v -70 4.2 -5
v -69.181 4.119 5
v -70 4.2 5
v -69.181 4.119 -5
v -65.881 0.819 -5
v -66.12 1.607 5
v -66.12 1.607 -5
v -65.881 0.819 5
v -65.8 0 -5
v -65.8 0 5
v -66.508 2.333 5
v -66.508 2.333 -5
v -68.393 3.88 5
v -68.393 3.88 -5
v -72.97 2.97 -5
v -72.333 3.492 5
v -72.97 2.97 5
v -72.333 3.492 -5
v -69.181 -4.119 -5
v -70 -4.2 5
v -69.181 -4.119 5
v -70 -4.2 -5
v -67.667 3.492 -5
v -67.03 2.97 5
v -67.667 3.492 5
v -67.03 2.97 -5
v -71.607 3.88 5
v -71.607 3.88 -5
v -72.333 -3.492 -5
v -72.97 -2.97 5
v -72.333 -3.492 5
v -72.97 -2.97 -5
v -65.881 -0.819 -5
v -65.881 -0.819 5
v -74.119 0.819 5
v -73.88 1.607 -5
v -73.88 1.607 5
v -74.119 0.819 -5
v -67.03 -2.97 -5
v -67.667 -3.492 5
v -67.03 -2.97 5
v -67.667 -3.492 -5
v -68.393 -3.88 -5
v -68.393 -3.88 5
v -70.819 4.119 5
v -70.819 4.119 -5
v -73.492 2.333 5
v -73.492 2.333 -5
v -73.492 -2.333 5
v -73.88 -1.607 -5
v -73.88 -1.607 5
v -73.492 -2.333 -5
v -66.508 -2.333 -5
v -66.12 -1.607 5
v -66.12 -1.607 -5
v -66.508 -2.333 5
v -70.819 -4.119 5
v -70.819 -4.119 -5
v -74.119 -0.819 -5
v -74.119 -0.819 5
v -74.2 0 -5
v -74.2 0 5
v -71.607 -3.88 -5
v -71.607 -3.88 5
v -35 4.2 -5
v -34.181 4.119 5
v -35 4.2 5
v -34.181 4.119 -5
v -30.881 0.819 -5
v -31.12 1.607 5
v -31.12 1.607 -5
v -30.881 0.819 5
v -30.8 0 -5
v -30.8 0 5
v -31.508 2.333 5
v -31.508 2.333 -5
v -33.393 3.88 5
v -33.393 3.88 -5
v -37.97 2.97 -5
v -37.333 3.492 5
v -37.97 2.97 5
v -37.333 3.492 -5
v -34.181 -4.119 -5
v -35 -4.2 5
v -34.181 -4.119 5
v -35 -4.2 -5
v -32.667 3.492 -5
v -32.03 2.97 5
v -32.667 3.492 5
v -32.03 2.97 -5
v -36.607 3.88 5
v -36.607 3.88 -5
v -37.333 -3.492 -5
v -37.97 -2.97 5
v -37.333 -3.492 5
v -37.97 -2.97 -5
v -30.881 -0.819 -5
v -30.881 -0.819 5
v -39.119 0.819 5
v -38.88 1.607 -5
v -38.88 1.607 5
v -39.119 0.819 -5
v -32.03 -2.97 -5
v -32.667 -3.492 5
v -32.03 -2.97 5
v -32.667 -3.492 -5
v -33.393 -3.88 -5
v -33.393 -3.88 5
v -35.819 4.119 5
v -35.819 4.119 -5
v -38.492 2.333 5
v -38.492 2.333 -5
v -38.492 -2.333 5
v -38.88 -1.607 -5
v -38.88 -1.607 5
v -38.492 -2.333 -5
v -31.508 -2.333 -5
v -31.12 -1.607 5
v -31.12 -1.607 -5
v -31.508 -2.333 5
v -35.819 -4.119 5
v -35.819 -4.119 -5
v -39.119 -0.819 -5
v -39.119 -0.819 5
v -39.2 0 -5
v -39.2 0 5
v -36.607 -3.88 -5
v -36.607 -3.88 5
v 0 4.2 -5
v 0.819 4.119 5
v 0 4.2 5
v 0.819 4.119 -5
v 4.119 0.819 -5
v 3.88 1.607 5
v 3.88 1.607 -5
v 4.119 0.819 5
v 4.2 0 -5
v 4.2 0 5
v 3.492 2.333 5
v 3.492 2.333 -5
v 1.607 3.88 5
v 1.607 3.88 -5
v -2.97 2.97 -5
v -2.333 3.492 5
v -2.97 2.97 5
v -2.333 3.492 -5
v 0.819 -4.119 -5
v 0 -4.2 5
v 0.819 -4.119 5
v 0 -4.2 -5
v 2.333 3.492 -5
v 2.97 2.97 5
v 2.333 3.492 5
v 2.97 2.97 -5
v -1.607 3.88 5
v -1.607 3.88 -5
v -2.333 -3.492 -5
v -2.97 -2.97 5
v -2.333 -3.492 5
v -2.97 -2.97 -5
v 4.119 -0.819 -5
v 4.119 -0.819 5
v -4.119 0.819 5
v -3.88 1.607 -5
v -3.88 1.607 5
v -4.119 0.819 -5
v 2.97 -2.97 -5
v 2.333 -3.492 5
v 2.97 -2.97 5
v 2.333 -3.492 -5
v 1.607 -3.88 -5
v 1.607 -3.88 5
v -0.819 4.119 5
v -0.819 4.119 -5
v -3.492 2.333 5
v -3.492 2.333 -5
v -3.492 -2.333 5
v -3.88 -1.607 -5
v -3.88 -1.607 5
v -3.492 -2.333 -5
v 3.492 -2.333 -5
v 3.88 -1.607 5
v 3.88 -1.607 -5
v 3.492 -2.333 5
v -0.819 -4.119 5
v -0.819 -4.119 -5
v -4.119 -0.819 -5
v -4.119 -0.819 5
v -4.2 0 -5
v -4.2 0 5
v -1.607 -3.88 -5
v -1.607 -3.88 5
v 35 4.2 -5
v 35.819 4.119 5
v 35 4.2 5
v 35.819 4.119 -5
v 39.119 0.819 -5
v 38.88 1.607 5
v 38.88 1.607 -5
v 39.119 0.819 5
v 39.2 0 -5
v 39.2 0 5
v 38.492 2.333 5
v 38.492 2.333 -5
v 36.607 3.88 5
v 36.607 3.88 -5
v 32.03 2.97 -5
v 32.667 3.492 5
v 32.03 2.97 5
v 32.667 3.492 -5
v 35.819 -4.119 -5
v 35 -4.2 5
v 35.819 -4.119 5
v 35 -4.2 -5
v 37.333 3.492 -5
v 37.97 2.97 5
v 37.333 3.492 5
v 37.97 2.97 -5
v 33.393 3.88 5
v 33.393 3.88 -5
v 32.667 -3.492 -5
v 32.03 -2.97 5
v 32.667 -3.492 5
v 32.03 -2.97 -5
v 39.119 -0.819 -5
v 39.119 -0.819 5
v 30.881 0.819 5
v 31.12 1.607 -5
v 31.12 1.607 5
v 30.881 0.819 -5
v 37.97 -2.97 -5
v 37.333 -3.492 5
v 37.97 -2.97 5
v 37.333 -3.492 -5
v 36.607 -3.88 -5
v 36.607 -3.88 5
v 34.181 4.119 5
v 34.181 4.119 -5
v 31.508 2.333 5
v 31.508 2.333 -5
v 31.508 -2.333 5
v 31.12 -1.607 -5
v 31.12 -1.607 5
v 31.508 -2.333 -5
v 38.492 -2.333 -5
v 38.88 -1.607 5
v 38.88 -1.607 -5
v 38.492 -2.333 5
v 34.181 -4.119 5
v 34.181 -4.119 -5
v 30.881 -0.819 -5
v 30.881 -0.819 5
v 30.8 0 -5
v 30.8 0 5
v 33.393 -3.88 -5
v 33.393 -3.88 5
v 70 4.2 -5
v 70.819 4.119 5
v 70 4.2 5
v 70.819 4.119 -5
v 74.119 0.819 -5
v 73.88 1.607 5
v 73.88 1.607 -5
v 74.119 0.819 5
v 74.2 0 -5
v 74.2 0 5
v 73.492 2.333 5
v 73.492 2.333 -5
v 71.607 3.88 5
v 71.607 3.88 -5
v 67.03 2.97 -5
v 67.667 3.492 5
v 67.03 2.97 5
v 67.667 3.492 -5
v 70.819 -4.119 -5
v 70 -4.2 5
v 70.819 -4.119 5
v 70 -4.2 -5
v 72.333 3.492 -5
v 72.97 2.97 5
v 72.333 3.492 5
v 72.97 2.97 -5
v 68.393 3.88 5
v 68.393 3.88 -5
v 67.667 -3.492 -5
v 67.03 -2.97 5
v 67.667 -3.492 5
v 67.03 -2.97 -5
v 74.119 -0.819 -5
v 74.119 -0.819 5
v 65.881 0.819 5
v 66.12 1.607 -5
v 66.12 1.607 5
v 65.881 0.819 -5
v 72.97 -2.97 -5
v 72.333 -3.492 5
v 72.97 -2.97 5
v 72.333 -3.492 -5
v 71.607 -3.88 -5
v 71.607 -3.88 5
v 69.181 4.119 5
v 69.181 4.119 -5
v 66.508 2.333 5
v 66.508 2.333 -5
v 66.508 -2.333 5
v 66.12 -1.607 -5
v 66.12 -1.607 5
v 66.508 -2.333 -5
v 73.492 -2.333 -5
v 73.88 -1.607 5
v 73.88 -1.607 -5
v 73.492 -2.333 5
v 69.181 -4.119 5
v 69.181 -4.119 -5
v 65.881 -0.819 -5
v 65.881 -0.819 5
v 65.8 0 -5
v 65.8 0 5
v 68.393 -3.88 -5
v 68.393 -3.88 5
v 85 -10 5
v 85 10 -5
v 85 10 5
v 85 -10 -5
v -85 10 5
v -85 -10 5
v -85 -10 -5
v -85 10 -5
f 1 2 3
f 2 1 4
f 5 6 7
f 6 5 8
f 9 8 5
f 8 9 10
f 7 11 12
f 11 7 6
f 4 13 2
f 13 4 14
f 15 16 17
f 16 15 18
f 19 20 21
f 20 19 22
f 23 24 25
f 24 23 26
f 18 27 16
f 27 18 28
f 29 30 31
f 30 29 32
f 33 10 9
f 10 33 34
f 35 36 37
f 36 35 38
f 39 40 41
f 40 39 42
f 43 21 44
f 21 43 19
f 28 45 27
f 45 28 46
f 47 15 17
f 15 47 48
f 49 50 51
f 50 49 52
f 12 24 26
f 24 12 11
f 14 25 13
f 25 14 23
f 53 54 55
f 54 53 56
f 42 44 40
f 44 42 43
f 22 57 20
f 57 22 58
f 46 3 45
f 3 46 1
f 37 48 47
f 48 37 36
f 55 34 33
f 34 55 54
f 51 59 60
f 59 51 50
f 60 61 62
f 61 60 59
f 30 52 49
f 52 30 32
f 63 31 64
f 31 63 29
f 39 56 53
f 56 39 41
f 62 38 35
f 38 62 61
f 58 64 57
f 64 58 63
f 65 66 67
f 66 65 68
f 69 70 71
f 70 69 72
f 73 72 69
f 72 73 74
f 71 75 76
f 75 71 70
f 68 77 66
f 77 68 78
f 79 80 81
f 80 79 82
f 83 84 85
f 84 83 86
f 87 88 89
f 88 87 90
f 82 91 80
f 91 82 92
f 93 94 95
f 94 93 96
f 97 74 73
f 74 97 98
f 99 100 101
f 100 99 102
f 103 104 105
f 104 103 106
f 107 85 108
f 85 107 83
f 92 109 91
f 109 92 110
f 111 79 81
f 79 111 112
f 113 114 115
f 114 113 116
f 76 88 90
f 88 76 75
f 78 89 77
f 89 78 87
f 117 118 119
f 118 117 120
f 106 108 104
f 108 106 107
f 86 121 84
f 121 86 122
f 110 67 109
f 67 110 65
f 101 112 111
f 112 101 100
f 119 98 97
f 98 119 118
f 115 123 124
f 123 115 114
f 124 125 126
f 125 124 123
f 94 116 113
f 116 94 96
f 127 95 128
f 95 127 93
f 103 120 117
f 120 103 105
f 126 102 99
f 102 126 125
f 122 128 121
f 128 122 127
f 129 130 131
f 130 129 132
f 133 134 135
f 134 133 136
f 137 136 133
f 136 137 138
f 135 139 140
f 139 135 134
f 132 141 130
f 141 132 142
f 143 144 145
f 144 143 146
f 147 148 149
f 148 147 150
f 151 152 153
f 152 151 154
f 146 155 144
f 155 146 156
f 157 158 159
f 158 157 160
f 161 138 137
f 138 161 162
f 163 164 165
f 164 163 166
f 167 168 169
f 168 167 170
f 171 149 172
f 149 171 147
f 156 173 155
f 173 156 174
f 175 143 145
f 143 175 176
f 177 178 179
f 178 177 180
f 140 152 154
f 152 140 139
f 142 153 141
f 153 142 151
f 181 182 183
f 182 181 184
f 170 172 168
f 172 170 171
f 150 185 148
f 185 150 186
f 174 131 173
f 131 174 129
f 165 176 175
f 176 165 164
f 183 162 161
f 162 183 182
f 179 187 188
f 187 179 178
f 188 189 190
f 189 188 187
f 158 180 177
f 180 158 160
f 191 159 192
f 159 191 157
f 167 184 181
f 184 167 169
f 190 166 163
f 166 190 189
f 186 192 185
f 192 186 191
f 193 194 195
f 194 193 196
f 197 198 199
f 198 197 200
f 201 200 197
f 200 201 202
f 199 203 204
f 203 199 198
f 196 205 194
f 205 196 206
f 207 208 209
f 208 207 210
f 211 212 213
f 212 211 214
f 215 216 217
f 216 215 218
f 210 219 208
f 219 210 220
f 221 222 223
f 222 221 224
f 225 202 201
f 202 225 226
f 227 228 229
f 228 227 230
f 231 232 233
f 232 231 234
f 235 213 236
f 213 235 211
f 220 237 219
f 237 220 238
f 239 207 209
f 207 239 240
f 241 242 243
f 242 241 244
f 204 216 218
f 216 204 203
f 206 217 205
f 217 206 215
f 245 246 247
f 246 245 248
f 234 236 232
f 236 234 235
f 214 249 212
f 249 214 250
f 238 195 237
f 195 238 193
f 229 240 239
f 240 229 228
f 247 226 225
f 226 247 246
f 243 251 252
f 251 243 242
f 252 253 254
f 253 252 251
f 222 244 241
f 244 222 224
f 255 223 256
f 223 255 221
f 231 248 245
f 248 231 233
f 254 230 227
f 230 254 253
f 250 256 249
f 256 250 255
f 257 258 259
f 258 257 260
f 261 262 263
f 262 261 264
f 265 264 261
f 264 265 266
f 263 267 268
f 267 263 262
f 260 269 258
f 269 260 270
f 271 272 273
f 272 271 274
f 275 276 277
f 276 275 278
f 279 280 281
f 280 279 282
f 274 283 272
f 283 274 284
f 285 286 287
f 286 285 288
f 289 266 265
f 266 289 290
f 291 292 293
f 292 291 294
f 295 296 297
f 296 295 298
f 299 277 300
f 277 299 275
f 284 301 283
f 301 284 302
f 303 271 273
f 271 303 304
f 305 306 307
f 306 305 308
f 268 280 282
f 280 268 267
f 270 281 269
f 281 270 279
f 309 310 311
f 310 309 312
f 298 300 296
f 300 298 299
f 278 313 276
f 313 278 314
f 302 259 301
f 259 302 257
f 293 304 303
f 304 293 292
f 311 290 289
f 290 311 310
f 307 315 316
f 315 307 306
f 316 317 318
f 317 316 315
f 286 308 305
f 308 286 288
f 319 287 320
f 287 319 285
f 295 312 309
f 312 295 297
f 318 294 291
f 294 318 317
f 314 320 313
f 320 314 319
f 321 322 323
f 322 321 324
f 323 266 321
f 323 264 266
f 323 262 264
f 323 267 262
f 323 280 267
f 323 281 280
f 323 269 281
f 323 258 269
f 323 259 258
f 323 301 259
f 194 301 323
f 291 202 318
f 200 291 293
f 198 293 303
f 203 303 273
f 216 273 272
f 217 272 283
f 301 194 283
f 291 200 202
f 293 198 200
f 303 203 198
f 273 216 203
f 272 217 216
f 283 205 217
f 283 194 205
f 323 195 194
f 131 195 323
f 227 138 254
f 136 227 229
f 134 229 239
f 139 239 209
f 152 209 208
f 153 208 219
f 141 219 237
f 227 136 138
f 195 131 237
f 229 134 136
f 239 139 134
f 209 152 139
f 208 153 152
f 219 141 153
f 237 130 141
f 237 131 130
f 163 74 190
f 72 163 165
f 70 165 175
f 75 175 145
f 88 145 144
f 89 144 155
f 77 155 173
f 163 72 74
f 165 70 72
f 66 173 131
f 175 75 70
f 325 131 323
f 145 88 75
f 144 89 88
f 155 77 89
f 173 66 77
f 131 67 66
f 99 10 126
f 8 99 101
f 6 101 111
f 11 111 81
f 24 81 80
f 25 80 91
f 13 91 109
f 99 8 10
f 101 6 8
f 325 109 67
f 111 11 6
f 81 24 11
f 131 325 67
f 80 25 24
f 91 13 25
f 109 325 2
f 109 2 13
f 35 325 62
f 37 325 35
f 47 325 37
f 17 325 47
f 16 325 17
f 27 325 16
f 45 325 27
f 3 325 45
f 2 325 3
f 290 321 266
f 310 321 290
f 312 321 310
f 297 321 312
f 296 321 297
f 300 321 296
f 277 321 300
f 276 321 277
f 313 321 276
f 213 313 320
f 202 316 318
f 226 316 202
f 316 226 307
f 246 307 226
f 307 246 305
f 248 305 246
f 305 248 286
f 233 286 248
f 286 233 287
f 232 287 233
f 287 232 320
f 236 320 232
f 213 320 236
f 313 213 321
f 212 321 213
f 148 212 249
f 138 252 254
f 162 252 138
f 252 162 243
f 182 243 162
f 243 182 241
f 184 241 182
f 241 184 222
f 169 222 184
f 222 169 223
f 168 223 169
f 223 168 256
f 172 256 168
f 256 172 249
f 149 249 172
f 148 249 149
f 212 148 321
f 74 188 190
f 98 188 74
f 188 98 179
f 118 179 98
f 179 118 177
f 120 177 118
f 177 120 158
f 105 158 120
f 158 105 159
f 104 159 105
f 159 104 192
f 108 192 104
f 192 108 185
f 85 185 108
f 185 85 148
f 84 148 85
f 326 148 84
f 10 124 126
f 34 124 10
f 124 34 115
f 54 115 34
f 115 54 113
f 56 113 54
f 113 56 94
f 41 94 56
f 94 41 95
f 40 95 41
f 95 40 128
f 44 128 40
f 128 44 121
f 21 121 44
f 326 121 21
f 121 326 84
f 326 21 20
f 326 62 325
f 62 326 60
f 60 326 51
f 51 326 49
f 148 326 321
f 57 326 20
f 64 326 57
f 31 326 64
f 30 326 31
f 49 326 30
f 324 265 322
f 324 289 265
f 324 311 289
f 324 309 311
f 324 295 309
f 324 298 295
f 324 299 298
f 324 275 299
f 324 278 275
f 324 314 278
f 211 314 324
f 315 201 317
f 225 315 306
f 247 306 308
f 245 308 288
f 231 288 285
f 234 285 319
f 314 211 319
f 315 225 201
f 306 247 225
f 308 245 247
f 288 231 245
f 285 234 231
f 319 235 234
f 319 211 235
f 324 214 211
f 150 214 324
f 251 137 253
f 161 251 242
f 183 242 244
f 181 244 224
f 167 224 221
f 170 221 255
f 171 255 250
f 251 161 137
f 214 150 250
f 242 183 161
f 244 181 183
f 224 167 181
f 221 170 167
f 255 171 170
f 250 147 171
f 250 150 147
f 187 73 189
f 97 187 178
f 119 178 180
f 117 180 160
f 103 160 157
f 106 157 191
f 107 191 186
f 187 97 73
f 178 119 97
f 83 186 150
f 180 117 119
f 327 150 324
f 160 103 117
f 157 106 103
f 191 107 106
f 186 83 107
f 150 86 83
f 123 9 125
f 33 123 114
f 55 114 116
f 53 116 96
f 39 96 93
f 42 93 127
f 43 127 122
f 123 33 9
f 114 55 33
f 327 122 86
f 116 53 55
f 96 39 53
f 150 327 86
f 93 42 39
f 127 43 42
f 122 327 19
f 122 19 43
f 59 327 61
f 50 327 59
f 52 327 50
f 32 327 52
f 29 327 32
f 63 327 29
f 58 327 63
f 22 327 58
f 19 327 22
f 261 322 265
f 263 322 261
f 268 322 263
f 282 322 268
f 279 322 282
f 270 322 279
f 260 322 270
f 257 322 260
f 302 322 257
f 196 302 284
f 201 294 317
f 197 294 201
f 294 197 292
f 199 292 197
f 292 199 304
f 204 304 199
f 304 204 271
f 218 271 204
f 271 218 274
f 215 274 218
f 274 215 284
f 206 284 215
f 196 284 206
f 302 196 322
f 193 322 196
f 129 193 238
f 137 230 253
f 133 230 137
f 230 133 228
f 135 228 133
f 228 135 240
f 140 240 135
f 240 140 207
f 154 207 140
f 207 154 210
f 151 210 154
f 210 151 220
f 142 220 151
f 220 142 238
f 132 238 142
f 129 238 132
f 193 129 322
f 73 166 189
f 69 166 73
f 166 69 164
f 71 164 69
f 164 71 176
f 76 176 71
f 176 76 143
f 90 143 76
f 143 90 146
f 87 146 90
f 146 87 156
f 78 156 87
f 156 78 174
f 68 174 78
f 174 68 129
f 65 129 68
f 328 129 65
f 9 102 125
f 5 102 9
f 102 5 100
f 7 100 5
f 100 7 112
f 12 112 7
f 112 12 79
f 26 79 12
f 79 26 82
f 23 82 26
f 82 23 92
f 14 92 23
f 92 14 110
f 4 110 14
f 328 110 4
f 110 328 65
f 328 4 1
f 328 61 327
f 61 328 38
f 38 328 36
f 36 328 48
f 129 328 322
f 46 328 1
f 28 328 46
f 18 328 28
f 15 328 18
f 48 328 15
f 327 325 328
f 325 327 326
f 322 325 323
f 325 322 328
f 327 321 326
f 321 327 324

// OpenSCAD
$fn = 32;

// ----------------------------------------------------------------------
// Hole bar, 5 x Ø8.4
// row layout, 15 mm edge offset
// ----------------------------------------------------------------------

// --- parameters (mm) ---
bar_w = 20;    // bar width (Y)
bar_t = 10;    // bar thickness (Z)
holes = 5;     // holes per row
hole_d = 8.4;  // hole diameter
edge = 15;     // offset from the bar end to the first hole
pitch = 35;    // pitch between neighbouring holes

// --- derived feature positions (mm) ---
span = (holes - 1) * pitch;   // = 140   distance between the end holes
bar_l = span + 2 * edge;      // = 170   overall bar length
start_x = -bar_l / 2 + edge;  // = -70   X of the first hole
feature_centers = [
  [start_x + 0 * pitch, 0],
  [start_x + 1 * pitch, 0],
  [start_x + 2 * pitch, 0],
  [start_x + 3 * pitch, 0],
  [start_x + 4 * pitch, 0]
];   // hole centres of the first row

// bar with one row of holes, drilled from feature_centers
difference() {
  translate([-bar_l / 2, -bar_w / 2, -bar_t / 2]) cube([bar_l, bar_w, bar_t]);
  for (centre = feature_centers)
    translate([centre[0], centre[1], 0])
      cylinder(d = hole_d, h = bar_t + 2, center = true);
}
